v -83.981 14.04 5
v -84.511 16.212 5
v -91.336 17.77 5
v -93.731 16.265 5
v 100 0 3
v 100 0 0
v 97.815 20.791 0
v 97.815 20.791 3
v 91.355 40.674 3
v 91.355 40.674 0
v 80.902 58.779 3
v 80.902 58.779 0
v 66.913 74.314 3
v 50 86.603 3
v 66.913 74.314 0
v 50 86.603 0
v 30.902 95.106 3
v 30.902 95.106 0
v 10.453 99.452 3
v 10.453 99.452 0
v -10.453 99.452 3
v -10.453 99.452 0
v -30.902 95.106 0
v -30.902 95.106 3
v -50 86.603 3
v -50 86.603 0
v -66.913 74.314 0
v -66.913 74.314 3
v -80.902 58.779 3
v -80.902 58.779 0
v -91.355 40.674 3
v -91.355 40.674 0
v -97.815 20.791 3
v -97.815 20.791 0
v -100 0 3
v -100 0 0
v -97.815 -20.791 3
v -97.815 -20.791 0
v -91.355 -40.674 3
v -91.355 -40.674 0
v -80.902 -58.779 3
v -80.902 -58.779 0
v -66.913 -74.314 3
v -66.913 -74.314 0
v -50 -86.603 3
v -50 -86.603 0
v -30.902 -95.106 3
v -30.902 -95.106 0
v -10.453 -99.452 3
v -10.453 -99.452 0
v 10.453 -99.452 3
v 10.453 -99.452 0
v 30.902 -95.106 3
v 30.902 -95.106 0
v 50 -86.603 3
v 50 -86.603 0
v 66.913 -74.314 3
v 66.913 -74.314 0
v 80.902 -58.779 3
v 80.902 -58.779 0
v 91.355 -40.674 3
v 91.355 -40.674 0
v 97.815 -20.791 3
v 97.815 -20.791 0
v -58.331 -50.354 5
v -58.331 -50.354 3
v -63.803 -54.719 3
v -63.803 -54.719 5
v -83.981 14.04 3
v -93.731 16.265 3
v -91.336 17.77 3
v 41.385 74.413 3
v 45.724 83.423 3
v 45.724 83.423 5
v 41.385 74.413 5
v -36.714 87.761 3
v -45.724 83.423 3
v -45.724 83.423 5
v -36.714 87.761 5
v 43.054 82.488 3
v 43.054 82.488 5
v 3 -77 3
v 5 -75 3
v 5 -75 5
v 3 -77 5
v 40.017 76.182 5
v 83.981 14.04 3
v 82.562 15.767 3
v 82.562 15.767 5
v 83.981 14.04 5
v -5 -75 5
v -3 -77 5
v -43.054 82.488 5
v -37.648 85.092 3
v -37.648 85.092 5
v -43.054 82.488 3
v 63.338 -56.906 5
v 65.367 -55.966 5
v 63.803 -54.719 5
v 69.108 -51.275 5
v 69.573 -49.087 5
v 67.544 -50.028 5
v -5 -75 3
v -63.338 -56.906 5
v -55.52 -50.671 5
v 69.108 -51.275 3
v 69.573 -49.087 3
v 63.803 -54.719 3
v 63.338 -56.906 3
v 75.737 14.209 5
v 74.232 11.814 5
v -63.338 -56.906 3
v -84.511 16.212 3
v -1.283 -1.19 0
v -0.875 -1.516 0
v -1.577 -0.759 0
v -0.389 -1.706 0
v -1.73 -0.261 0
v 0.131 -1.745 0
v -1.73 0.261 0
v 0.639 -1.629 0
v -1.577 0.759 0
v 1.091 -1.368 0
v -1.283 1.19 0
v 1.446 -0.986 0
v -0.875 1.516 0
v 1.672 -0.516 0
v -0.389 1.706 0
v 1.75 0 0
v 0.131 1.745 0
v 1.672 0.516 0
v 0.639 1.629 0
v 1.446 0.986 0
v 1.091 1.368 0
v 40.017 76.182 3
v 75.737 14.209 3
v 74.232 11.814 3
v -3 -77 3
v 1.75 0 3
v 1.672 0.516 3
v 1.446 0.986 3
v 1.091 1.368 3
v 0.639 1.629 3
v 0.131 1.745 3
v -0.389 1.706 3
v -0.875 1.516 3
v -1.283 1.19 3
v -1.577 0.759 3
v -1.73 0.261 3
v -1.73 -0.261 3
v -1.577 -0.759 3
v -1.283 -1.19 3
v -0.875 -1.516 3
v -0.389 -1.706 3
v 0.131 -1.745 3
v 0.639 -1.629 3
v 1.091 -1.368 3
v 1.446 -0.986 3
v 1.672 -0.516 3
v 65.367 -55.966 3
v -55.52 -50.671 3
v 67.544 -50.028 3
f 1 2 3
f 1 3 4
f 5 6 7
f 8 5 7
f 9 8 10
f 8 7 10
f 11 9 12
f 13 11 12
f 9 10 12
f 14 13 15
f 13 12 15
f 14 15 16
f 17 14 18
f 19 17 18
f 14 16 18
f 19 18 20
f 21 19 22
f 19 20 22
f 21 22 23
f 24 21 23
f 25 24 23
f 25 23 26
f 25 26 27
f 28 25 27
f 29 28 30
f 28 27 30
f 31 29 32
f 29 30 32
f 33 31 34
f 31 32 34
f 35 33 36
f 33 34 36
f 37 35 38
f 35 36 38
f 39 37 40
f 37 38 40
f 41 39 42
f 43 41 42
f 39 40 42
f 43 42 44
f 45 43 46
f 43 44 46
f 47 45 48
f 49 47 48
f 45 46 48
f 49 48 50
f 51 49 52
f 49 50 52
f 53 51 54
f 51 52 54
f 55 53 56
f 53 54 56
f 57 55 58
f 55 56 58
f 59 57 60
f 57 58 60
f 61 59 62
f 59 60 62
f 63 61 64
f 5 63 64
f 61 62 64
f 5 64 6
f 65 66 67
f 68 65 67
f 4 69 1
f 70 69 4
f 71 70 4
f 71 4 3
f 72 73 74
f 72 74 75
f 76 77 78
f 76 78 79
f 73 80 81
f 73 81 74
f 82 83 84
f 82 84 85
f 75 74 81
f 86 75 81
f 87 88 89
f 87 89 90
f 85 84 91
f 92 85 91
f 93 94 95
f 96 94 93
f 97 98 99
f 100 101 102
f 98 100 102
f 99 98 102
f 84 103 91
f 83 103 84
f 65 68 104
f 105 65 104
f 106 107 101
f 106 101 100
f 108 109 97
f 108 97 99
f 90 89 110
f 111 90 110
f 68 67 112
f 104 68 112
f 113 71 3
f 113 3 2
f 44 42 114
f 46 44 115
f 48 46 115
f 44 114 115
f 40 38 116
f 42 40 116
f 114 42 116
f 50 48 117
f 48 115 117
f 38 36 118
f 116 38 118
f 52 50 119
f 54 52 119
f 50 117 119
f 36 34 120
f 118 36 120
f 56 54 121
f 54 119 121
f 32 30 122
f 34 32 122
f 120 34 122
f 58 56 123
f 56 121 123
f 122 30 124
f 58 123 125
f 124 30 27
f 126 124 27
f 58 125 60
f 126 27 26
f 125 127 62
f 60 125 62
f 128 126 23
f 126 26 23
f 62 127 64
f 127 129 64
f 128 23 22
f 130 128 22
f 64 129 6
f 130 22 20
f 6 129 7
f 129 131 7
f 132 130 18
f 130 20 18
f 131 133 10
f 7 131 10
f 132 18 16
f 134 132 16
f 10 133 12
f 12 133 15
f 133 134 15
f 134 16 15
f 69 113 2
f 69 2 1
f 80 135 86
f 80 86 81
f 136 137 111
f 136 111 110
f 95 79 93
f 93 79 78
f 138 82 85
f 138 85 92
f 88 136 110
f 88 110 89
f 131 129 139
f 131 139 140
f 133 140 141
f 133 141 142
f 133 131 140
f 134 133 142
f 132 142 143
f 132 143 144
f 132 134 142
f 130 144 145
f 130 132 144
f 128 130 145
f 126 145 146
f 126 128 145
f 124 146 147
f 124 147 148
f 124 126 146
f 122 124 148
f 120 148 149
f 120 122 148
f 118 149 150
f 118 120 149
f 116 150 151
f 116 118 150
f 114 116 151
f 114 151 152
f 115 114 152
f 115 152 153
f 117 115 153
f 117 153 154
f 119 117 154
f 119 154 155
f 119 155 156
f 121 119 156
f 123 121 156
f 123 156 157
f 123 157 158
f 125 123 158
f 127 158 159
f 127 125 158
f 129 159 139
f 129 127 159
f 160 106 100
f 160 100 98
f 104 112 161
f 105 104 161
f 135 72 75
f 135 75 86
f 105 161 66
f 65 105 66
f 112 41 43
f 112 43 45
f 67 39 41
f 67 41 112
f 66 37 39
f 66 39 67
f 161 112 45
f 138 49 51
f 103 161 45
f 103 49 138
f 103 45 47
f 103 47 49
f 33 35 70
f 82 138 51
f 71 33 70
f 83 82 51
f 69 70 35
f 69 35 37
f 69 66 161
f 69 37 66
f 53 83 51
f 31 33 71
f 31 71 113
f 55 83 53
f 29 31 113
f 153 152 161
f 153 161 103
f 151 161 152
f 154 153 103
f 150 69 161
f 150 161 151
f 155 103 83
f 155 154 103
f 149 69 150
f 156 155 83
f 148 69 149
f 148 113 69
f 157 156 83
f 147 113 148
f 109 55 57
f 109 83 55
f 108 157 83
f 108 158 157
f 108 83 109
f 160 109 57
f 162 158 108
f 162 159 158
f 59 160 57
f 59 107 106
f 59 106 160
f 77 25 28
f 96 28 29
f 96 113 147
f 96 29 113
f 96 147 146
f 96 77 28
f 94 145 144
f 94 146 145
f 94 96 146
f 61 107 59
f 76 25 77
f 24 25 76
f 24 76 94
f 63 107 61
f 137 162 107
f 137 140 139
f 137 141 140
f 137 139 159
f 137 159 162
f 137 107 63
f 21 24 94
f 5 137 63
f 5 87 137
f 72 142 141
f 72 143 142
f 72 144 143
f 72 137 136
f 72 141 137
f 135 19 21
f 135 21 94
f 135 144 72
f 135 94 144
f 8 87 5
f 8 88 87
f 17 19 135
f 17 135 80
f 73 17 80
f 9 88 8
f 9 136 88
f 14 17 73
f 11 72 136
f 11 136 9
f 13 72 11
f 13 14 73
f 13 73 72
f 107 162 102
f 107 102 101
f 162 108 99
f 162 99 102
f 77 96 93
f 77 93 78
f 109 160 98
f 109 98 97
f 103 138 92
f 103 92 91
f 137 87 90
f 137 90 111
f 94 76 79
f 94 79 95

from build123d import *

# Parameters (mm, degrees)
SKETCH1_R           = 100
SKETCH1_R_2         = 1.75
BOSS_EXTRUDE1_DEPTH = 3
BOSS_EXTRUDE2_DEPTH = 2


with BuildPart() as part:
    # Sketch1 → Boss-Extrude1 (new body)
    with BuildSketch(Plane.XY):
        Circle(SKETCH1_R)
        Circle(SKETCH1_R_2, mode=Mode.SUBTRACT)
    extrude(amount=BOSS_EXTRUDE1_DEPTH)

    # Sketch2 → Boss-Extrude2 (add)
    with BuildSketch(Plane.XY.offset(3)):
        Polygon((-3, -77), (-5, -75), (5, -75), (3, -77), align=None)
        Polygon((-58.330554744, -50.354209191), (-63.803375122, -54.718637804), (-63.338227, -56.90579057), (-55.519912176, -50.670892552), align=None)
        Polygon((-91.335858635, 17.769663121), (-84.51136325, 16.212016584), (-83.981477205, 14.039639825), (-93.730756327, 16.264849165), align=None)
        Polygon((-43.054094342, 82.488453498), (-45.723799556, 83.422623755), (-36.714110877, 87.761461146), (-37.648281134, 85.091755932), align=None)
        Polygon((43.054094342, 82.488453498), (45.723799556, 83.422623755), (41.384962165, 74.412935076), (40.016908168, 76.181671422), align=None)
        Polygon((82.561507425, 15.766974716), (83.981477205, 14.039639825), (74.232198083, 11.814430486), (75.73701204, 14.209328178), align=None)
        Polygon((69.573125019, -49.087475746), (69.107976898, -51.274628512), (65.367038087, -55.965617407), (63.338227, -56.90579057), (63.803375122, -54.718637804), (67.544313933, -50.027648909), align=None)
    extrude(amount=BOSS_EXTRUDE2_DEPTH)


solid = part.part
